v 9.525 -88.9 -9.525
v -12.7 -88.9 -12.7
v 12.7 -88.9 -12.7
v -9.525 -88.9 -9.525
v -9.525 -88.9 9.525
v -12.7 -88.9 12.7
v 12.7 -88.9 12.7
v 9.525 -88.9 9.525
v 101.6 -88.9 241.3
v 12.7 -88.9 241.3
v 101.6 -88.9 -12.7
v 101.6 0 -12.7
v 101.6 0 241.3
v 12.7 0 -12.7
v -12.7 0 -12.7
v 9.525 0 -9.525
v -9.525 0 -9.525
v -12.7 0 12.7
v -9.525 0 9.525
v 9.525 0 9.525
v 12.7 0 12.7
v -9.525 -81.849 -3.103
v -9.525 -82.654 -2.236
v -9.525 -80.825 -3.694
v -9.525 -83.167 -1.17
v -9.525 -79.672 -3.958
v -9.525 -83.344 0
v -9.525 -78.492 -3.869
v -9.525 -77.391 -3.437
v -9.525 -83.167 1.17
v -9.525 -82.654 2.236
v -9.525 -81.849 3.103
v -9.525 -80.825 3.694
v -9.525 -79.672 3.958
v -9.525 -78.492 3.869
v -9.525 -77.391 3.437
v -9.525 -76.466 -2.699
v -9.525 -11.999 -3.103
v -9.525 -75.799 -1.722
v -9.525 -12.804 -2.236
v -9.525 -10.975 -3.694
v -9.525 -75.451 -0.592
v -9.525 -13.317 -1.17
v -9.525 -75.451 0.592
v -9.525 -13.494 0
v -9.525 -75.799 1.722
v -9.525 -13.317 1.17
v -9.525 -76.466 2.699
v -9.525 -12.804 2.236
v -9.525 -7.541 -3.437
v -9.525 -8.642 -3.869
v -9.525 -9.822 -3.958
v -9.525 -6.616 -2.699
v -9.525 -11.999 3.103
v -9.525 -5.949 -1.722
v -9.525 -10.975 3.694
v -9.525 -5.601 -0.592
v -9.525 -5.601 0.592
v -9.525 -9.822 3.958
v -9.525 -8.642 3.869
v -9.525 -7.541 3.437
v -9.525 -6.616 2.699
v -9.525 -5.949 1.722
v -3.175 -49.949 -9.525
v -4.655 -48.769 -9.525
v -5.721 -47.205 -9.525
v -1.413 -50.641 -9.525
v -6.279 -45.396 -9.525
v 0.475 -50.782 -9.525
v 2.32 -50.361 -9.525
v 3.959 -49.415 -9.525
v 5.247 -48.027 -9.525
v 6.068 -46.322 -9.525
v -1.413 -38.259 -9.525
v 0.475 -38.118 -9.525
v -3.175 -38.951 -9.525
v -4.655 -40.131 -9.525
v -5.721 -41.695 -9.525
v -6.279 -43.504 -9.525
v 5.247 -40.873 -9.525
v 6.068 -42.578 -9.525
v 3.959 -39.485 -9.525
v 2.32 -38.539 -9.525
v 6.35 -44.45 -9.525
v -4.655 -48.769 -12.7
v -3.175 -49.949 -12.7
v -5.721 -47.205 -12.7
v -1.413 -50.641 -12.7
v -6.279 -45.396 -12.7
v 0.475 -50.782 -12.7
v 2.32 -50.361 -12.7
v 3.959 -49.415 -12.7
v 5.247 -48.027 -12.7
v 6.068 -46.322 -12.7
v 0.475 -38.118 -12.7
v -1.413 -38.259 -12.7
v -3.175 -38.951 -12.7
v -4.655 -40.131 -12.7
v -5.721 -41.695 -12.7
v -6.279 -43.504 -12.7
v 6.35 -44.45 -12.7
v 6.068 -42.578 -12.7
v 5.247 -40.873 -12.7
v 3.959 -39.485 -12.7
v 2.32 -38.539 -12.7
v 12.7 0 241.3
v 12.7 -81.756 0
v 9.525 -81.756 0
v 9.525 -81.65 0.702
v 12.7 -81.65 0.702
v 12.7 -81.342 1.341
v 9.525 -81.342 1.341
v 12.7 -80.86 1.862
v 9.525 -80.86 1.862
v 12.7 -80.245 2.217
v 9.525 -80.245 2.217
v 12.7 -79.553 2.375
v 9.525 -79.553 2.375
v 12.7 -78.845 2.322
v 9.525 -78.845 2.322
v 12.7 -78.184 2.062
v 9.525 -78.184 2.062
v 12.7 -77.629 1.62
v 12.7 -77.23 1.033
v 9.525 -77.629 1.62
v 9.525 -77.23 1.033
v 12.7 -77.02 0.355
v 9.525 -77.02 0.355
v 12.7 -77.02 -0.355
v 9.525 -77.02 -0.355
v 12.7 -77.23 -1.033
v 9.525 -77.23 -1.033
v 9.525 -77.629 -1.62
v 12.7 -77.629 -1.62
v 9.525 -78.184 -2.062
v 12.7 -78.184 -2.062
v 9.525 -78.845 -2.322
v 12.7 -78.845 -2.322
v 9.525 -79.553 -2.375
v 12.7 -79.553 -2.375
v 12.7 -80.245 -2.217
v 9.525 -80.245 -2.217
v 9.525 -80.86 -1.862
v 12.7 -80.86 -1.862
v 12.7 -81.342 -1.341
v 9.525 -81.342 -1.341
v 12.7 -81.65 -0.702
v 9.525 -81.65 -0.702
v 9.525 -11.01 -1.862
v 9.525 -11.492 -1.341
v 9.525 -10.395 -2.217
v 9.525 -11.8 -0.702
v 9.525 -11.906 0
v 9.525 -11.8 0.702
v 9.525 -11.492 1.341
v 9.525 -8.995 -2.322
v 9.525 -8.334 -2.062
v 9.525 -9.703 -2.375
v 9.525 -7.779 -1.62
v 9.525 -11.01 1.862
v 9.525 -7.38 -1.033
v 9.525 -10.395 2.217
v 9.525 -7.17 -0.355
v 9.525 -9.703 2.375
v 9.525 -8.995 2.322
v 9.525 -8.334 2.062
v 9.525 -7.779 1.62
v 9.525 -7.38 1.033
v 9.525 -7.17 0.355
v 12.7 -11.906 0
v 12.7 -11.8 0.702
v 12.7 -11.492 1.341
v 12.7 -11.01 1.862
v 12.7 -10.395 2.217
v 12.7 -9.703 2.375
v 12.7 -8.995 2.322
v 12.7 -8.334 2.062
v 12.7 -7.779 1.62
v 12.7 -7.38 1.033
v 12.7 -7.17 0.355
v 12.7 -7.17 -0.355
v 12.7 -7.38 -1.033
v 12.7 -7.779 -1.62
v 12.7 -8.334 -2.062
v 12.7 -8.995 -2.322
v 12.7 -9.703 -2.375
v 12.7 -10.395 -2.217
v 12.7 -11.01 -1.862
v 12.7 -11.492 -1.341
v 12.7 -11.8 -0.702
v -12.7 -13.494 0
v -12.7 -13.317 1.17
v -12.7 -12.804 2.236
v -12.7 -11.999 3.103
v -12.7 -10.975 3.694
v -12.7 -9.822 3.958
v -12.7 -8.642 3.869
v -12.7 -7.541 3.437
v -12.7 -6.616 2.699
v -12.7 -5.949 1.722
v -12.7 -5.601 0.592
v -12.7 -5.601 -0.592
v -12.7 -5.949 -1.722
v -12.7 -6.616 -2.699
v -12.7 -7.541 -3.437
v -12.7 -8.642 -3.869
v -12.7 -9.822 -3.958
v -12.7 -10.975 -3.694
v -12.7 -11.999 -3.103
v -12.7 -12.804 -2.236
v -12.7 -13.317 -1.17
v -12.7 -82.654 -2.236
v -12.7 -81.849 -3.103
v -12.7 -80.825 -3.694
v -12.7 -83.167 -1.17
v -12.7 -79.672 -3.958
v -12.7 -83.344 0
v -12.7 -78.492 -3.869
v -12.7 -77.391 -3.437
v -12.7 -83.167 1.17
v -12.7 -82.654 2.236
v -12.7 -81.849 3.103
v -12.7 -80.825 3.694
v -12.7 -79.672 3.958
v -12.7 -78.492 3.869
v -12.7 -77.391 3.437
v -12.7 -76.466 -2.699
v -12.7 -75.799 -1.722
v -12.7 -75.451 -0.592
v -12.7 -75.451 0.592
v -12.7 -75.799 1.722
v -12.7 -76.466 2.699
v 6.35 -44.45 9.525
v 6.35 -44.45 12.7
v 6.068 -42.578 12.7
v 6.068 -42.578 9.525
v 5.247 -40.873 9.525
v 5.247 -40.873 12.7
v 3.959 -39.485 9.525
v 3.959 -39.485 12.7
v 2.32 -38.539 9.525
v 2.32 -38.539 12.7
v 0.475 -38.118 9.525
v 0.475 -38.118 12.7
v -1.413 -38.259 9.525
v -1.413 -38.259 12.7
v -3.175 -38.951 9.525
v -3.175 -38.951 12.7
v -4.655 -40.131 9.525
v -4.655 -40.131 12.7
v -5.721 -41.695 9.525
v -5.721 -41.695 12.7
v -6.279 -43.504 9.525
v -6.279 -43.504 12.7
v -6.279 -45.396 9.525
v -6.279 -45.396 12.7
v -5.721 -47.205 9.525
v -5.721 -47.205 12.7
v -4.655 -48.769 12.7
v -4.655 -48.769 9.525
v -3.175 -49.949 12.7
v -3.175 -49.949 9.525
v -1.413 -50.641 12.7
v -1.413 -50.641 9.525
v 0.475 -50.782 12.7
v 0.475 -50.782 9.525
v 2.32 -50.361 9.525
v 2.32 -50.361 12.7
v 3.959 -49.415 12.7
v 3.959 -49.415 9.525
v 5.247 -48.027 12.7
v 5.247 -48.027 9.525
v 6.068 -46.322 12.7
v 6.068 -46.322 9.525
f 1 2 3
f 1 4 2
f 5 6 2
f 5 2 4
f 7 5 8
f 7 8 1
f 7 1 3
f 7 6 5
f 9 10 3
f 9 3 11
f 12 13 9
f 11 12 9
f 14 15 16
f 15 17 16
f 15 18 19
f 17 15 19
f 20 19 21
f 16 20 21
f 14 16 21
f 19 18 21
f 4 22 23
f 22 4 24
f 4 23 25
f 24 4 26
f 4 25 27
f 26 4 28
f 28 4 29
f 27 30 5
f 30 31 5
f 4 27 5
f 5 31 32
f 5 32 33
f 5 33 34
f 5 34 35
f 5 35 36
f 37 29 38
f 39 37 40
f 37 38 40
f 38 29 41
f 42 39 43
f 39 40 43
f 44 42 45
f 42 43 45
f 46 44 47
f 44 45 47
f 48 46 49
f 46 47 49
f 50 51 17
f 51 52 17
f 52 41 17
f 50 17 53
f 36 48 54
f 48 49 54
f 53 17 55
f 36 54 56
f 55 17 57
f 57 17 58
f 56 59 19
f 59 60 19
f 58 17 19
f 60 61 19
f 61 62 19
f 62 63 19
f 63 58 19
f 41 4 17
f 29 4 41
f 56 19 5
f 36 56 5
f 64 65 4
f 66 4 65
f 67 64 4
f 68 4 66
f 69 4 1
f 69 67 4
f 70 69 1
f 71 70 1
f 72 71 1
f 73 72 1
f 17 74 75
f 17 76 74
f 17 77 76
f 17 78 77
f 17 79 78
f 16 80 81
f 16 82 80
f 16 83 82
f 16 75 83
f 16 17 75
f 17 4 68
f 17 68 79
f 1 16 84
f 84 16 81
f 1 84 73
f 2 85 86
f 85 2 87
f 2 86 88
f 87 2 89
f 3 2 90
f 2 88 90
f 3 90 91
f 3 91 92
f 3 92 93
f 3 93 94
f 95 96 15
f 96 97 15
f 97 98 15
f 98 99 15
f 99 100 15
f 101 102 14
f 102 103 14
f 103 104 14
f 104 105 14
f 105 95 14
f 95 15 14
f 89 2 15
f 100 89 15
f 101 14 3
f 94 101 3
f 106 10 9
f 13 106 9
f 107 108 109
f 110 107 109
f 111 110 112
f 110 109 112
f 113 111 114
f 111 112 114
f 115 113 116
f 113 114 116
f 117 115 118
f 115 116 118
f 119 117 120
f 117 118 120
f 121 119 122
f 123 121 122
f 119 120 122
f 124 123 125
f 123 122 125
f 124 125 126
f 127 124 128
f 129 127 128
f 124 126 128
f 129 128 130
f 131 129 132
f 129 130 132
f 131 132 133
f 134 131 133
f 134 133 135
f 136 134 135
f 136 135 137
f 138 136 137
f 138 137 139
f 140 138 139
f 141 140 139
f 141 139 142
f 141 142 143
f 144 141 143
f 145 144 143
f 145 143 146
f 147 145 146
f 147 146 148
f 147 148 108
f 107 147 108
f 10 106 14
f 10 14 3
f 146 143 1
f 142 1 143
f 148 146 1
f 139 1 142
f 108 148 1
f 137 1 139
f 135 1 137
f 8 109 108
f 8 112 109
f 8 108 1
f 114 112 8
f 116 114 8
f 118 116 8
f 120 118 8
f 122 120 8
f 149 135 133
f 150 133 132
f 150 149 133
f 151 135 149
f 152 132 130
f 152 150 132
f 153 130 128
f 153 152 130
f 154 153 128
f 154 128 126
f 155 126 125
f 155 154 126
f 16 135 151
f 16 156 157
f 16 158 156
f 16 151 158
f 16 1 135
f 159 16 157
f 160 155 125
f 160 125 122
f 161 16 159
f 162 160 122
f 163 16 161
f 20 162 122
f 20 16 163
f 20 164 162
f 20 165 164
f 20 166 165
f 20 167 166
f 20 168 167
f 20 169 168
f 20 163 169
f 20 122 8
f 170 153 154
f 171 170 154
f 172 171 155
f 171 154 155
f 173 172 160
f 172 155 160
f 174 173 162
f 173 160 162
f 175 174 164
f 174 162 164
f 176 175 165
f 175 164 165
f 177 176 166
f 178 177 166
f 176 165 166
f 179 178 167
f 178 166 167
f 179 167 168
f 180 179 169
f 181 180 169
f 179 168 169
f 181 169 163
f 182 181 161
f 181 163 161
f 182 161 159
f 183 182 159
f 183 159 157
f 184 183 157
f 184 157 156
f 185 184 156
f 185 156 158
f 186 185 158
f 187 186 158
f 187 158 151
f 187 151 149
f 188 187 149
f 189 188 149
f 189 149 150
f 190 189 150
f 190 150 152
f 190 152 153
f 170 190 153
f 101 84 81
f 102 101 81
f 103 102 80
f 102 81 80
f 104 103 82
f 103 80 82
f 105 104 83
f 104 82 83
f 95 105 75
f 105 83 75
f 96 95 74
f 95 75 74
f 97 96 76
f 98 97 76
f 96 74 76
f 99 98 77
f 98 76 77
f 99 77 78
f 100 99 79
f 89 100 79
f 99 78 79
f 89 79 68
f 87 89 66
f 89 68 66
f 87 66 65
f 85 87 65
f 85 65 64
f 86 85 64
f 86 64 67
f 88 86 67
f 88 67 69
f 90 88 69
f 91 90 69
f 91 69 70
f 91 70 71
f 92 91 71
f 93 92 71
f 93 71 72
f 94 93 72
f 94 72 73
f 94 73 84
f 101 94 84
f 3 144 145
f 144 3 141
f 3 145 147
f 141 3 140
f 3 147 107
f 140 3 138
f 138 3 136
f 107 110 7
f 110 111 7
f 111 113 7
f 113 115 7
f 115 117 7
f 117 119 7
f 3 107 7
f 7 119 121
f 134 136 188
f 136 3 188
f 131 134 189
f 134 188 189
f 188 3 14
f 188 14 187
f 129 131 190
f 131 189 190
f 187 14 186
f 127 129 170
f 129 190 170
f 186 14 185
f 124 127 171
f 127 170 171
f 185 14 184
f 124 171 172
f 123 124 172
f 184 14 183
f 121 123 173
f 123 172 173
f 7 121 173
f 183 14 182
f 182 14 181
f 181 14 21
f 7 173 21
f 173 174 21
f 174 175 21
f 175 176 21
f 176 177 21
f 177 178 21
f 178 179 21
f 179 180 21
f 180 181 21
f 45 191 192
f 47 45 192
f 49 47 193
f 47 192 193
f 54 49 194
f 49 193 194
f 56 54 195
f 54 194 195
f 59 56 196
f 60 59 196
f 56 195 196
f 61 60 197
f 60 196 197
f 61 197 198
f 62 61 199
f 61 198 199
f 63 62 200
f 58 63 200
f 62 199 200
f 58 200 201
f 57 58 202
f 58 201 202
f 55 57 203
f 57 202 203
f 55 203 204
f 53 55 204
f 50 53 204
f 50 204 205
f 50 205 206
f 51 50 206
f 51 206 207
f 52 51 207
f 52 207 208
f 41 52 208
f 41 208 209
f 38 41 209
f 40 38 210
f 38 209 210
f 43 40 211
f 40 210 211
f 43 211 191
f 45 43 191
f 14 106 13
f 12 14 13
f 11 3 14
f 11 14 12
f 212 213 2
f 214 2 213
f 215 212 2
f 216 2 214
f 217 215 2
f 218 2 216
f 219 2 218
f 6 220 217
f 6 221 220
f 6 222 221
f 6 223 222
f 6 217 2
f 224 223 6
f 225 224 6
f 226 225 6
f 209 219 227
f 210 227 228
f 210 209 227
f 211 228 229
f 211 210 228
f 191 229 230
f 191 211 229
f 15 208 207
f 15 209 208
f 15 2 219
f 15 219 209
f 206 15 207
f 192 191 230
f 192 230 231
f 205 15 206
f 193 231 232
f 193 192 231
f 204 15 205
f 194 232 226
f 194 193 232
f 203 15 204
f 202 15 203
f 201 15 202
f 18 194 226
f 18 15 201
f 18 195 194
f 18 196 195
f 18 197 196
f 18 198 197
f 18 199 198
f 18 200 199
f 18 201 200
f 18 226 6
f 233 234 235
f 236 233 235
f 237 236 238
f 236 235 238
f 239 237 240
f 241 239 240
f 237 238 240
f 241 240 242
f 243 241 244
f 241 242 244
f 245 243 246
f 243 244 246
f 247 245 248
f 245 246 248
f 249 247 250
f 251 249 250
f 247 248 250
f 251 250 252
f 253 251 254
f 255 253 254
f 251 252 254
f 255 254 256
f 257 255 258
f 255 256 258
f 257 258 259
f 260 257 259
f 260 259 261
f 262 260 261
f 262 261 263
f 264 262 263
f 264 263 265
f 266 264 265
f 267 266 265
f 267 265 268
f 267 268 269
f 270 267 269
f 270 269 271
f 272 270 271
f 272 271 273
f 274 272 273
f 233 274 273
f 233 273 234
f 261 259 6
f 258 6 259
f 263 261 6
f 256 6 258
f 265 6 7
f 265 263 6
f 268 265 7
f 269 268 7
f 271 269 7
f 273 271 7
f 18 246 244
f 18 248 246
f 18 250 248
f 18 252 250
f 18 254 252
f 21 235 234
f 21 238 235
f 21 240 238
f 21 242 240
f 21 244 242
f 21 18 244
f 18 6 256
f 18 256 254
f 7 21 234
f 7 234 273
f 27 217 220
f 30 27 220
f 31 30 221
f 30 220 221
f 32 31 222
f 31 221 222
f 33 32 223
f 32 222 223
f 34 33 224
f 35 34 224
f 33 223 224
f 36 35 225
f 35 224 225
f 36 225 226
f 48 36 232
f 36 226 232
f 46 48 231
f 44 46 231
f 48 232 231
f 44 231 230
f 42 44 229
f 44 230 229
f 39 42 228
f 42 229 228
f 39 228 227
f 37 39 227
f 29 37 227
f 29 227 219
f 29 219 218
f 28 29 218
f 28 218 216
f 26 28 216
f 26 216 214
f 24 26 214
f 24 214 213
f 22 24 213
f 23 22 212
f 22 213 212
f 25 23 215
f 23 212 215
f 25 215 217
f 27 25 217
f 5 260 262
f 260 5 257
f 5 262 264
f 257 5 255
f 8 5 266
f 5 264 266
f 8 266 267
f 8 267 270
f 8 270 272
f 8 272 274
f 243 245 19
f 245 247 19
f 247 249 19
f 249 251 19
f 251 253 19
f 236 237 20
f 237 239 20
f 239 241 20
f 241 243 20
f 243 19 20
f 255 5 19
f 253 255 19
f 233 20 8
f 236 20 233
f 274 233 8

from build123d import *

# Parameters (mm, degrees)
F0_W     = 25.4
F0_H     = 25.4
F0_W_2   = 19.05
F0_H_2   = 19.05
F1_DEPTH = 88.9
F2_R     = 6.35
F3_DEPTH = 25.401
F4_R     = 2.38125
F5_DEPTH = 25.401
F6_R     = 3.96875
F7_DEPTH = 3.175
F8_W     = 88.9
F8_H     = 88.9
F9_DEPTH = 254


with BuildPart() as f1:
    # F0 (on Front) → F1 (new body)
    with BuildSketch(Plane.XZ):
        Rectangle(F0_W, F0_H)
        Rectangle(F0_W_2, F0_H_2, mode=Mode.SUBTRACT)
    extrude(amount=F1_DEPTH)

    # F2 (on face) → F3 (cut, through all)
    with BuildSketch(Plane.XY.offset(12.7)):
        with Locations((0, -44.45)):
            Circle(F2_R)
    extrude(amount=-F3_DEPTH, mode=Mode.SUBTRACT)

    # F4 (on face) → F5 (cut, through all)
    with BuildSketch(Plane(origin=(-12.7, 0, 0), x_dir=(0, -1, 0), z_dir=(-1, 0, 0))):
        with Locations((9.525, 0)):
            Circle(F4_R)
        with Locations((79.375, 0)):
            Circle(F4_R)
    extrude(amount=-F5_DEPTH, mode=Mode.SUBTRACT)

    # F6 (on face) → F7 (cut, through all)
    with BuildSketch(Plane(origin=(-12.7, 0, 0), x_dir=(0, -1, 0), z_dir=(-1, 0, 0))):
        with Locations((9.525, 0)):
            Circle(F6_R)
        with Locations((79.375, 0)):
            Circle(F6_R)
    extrude(amount=-F7_DEPTH, mode=Mode.SUBTRACT)


with BuildPart() as f9:
    # F8 (on face) → F9 (new body)
    with BuildSketch(Plane(origin=(0, 0, -12.7), x_dir=(1, 0, 0), z_dir=(0, 0, -1))):
        with Locations((57.15, 44.45)):
            Rectangle(F8_W, F8_H)
    extrude(amount=-F9_DEPTH)


solid = Compound([f1.part, f9.part])
